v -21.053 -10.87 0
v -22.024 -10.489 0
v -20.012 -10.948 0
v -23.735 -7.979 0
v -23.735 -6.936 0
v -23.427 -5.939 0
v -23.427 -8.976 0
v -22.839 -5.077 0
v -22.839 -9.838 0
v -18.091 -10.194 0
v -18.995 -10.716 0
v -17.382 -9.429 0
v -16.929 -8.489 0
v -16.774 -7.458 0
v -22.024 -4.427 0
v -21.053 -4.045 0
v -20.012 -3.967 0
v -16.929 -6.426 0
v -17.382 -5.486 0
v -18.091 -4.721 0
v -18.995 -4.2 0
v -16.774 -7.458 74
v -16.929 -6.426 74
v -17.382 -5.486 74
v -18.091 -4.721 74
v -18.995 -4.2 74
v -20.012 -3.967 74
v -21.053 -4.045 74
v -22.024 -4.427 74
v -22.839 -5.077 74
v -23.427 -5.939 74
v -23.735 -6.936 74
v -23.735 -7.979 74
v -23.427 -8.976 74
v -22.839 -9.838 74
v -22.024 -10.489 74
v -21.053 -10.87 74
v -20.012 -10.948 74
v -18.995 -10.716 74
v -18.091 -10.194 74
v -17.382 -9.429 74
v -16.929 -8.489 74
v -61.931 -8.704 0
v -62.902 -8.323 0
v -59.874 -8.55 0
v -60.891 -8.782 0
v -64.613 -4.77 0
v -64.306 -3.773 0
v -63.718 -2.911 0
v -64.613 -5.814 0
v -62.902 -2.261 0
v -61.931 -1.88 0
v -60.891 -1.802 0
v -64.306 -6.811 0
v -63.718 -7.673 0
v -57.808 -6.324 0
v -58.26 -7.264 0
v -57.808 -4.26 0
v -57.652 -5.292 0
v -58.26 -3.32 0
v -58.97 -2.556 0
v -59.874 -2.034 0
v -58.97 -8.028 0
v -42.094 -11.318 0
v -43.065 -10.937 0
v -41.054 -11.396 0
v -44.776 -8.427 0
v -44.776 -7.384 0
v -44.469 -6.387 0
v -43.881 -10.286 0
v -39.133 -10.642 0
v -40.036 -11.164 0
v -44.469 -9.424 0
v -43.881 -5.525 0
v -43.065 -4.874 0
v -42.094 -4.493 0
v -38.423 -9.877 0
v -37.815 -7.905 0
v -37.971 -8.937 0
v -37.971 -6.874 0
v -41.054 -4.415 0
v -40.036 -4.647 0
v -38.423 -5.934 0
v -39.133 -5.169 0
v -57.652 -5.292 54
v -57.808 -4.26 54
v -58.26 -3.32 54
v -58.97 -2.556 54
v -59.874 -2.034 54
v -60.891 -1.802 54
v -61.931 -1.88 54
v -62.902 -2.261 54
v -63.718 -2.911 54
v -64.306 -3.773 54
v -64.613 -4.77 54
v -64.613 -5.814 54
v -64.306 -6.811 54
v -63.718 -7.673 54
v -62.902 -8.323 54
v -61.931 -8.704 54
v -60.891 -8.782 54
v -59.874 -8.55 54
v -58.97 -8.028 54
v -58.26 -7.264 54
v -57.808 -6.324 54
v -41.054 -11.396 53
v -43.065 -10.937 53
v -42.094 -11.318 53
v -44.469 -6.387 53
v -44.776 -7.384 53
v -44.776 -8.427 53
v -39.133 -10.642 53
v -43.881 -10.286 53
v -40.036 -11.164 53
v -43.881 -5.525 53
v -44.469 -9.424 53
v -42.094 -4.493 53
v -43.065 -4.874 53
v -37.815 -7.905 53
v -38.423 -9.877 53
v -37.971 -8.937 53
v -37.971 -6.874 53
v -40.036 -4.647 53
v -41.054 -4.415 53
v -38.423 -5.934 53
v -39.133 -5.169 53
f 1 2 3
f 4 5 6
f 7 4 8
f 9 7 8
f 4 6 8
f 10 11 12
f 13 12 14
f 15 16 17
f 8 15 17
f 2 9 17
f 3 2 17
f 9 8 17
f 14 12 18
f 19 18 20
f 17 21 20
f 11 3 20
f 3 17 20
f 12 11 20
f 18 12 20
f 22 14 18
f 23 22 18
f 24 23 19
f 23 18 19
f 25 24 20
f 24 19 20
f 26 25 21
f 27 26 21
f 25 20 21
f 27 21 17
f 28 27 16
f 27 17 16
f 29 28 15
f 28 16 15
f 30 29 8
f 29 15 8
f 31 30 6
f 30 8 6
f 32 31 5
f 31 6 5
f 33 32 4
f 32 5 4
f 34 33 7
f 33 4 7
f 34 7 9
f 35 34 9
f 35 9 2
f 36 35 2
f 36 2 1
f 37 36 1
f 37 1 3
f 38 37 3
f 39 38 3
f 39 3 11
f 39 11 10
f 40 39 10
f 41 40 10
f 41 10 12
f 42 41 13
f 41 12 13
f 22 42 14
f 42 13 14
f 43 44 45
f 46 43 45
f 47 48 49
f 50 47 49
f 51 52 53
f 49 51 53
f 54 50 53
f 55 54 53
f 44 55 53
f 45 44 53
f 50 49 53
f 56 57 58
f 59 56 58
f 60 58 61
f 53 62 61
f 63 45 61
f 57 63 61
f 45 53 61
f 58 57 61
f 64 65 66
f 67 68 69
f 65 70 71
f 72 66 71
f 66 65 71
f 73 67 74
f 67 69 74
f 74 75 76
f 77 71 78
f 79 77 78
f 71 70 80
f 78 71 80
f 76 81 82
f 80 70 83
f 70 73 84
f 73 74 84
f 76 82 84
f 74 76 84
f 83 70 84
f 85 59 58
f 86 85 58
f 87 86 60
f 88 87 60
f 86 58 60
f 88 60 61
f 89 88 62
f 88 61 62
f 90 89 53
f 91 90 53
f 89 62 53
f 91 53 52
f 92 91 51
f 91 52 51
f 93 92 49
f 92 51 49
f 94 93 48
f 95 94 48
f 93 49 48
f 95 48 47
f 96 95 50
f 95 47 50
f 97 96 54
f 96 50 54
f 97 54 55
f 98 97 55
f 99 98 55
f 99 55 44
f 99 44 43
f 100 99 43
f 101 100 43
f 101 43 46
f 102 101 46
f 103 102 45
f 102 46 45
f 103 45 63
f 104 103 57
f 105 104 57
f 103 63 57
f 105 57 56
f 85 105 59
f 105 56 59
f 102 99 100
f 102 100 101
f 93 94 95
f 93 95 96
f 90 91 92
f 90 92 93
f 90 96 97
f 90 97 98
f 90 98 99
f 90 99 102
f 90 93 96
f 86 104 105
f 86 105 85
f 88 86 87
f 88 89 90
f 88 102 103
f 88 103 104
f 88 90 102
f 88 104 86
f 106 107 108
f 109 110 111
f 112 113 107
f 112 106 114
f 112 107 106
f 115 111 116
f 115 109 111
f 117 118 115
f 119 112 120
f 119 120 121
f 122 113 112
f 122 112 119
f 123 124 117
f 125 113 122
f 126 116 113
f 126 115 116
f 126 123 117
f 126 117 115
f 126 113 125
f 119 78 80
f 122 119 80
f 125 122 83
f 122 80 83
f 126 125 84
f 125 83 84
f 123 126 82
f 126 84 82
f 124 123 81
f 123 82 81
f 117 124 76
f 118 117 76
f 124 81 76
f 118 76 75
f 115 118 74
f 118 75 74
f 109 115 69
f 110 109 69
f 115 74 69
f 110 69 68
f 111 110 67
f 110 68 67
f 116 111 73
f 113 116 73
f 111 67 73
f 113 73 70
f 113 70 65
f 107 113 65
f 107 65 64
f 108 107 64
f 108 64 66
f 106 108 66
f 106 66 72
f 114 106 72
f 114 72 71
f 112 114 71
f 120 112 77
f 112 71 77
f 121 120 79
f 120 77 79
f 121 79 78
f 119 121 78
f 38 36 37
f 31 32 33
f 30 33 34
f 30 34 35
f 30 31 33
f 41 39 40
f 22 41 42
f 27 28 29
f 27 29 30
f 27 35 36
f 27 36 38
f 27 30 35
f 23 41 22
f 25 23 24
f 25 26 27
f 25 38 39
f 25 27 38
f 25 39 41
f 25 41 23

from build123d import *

# Parameters (mm, degrees)
SKETCH1_R           = 3.5
BOSS_EXTRUDE1_DEPTH = 54
SKETCH2_R           = 3.5
BOSS_EXTRUDE2_DEPTH = 53
SKETCH3_R           = 3.5
BOSS_EXTRUDE3_DEPTH = 74


with BuildPart() as part:
    # Sketch1 → Boss-Extrude1 (new body)
    with BuildSketch(Plane.XY):
        with Locations((-61.152195741, -5.292016939)):
            Circle(SKETCH1_R)
    extrude(amount=BOSS_EXTRUDE1_DEPTH)


with BuildPart() as body_2:
    # Sketch2 → Boss-Extrude2 (new body)
    with BuildSketch(Plane.XY):
        with Locations((-41.315116744, -7.905454397)):
            Circle(SKETCH2_R)
    extrude(amount=BOSS_EXTRUDE2_DEPTH)


with BuildPart() as body_3:
    # Sketch3 → Boss-Extrude3 (new body)
    with BuildSketch(Plane.XY):
        with Locations((-20.273710763, -7.457605747)):
            Circle(SKETCH3_R)
    extrude(amount=BOSS_EXTRUDE3_DEPTH)


solid = Compound([part.part, body_2.part, body_3.part])
